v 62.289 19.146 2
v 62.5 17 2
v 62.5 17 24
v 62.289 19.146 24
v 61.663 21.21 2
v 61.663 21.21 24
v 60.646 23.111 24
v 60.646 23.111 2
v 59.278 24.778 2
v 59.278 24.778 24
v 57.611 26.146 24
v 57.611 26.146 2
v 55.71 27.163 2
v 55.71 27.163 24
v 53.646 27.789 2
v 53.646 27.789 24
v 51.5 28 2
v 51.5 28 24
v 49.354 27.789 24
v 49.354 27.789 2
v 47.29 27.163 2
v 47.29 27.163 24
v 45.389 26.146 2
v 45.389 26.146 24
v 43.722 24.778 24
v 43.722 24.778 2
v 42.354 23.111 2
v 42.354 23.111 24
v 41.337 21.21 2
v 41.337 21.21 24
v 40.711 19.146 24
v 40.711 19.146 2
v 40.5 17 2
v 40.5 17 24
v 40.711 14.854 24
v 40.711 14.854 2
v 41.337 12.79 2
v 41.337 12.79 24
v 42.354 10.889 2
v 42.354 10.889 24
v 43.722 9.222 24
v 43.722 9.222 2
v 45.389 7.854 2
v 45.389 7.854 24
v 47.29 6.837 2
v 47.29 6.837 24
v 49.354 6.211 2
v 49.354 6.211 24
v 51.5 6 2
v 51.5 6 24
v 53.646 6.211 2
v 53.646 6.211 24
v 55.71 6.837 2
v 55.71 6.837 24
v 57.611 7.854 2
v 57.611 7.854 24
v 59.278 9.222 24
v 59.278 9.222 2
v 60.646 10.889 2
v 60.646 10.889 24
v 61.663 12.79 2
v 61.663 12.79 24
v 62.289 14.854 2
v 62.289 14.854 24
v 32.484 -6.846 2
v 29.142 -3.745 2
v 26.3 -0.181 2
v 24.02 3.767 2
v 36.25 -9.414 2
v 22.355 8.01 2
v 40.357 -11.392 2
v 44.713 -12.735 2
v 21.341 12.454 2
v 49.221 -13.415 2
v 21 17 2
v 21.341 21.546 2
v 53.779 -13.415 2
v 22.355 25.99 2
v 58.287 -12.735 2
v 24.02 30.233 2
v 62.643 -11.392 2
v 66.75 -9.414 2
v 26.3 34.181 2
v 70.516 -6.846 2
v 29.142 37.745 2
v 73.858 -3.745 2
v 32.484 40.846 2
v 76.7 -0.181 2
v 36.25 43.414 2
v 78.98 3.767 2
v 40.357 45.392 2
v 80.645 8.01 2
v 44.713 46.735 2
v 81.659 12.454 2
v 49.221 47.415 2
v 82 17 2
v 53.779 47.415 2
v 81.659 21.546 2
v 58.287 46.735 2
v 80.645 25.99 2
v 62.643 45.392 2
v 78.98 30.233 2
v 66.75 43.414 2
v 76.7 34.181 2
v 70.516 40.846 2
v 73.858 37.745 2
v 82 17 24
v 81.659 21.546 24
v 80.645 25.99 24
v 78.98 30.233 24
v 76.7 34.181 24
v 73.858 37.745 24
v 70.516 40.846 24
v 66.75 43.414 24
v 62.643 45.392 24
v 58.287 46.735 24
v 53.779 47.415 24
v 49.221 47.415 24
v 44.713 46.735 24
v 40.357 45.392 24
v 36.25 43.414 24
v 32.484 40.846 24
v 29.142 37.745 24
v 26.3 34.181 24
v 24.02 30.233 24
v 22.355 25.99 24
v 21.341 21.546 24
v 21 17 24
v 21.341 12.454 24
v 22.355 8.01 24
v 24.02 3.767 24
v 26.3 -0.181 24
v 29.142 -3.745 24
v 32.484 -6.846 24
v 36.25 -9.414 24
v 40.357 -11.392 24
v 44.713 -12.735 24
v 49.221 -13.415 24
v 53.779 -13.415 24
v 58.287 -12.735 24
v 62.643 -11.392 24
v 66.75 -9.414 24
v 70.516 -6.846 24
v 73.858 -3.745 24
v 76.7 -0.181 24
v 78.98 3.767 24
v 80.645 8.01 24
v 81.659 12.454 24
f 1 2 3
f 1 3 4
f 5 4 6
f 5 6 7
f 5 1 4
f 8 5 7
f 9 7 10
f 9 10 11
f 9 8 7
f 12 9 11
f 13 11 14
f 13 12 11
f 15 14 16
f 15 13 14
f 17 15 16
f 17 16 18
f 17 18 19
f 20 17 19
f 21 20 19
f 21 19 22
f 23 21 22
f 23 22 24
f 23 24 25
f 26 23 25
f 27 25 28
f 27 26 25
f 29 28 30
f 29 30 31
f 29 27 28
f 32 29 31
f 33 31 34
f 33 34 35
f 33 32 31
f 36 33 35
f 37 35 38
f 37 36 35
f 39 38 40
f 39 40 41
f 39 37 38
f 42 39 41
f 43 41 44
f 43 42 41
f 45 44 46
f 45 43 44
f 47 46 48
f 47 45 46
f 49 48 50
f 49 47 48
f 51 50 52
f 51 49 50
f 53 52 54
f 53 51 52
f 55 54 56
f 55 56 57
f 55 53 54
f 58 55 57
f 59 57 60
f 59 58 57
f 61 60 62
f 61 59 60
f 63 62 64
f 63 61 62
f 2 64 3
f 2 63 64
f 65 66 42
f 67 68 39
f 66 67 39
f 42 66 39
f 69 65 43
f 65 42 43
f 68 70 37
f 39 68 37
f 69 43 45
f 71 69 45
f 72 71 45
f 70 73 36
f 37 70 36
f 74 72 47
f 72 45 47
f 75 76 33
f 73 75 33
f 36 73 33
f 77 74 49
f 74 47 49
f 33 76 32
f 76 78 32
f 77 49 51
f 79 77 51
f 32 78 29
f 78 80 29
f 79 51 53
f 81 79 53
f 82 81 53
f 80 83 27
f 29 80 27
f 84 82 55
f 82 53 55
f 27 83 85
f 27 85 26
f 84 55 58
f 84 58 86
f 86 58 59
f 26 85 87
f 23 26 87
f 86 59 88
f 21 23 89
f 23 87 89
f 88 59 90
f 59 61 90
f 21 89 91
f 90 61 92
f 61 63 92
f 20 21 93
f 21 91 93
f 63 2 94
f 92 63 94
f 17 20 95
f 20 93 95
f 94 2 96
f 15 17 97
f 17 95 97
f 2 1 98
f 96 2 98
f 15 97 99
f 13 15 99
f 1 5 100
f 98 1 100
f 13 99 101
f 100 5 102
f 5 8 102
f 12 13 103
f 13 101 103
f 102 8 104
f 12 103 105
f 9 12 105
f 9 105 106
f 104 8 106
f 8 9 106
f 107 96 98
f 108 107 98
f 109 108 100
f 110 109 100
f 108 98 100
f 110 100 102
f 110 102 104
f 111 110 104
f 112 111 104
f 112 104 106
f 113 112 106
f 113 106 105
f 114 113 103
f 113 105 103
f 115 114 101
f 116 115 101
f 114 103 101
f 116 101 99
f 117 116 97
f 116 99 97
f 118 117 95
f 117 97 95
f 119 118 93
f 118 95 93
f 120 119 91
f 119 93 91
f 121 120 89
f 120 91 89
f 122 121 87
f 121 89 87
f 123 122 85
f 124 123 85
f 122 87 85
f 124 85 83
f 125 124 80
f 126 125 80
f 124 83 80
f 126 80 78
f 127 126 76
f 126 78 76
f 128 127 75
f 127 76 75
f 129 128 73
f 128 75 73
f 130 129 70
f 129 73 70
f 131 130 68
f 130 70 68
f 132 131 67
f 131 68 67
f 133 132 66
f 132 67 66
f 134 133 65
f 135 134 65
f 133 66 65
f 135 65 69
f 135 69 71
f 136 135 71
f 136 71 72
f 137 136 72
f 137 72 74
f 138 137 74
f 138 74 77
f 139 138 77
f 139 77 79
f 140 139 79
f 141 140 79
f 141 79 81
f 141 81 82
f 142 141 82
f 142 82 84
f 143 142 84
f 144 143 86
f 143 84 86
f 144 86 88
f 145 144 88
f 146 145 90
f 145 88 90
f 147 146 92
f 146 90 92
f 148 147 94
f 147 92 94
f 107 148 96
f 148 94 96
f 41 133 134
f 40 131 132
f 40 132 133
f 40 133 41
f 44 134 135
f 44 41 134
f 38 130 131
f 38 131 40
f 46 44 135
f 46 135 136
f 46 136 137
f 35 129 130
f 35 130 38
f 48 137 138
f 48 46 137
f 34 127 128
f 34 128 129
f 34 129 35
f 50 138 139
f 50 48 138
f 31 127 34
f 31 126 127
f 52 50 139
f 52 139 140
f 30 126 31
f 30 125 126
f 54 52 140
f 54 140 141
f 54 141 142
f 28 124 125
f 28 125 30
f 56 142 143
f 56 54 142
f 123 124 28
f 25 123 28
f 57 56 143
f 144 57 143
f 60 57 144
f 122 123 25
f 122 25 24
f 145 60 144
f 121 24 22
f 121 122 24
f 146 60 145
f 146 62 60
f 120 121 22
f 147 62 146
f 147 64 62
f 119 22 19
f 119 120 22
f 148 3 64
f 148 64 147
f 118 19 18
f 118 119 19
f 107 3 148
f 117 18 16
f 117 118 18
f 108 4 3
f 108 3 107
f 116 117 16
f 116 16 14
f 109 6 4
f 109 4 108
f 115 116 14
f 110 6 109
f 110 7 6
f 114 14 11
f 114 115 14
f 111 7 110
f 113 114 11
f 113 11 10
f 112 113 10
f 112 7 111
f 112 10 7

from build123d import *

# Parameters (mm, degrees)
CYLINDER007_R     = 11
CYLINDER007_DEPTH = 22
CYLINDER006_R     = 30.5
CYLINDER006_DEPTH = 22


with BuildPart() as cylinder007:
    # Cylinder007 → Cylinder007 (new body)
    with BuildSketch(Plane.XY):
        Circle(CYLINDER007_R)
    extrude(amount=CYLINDER007_DEPTH)


with BuildPart() as coilarea001copper:
    # Cylinder006 → Cylinder006 (new body)
    with BuildSketch(Plane.XY):
        Circle(CYLINDER006_R)
    extrude(amount=CYLINDER006_DEPTH)

    # Cut006: cut Cylinder007
    add(cylinder007.part, mode=Mode.SUBTRACT)


with BuildPart() as coilarea001copper_1:
    # Cut006 placement: moved
    add(coilarea001copper.part.moved(Location((51.5, 17, 2))))


solid = coilarea001copper_1.part
